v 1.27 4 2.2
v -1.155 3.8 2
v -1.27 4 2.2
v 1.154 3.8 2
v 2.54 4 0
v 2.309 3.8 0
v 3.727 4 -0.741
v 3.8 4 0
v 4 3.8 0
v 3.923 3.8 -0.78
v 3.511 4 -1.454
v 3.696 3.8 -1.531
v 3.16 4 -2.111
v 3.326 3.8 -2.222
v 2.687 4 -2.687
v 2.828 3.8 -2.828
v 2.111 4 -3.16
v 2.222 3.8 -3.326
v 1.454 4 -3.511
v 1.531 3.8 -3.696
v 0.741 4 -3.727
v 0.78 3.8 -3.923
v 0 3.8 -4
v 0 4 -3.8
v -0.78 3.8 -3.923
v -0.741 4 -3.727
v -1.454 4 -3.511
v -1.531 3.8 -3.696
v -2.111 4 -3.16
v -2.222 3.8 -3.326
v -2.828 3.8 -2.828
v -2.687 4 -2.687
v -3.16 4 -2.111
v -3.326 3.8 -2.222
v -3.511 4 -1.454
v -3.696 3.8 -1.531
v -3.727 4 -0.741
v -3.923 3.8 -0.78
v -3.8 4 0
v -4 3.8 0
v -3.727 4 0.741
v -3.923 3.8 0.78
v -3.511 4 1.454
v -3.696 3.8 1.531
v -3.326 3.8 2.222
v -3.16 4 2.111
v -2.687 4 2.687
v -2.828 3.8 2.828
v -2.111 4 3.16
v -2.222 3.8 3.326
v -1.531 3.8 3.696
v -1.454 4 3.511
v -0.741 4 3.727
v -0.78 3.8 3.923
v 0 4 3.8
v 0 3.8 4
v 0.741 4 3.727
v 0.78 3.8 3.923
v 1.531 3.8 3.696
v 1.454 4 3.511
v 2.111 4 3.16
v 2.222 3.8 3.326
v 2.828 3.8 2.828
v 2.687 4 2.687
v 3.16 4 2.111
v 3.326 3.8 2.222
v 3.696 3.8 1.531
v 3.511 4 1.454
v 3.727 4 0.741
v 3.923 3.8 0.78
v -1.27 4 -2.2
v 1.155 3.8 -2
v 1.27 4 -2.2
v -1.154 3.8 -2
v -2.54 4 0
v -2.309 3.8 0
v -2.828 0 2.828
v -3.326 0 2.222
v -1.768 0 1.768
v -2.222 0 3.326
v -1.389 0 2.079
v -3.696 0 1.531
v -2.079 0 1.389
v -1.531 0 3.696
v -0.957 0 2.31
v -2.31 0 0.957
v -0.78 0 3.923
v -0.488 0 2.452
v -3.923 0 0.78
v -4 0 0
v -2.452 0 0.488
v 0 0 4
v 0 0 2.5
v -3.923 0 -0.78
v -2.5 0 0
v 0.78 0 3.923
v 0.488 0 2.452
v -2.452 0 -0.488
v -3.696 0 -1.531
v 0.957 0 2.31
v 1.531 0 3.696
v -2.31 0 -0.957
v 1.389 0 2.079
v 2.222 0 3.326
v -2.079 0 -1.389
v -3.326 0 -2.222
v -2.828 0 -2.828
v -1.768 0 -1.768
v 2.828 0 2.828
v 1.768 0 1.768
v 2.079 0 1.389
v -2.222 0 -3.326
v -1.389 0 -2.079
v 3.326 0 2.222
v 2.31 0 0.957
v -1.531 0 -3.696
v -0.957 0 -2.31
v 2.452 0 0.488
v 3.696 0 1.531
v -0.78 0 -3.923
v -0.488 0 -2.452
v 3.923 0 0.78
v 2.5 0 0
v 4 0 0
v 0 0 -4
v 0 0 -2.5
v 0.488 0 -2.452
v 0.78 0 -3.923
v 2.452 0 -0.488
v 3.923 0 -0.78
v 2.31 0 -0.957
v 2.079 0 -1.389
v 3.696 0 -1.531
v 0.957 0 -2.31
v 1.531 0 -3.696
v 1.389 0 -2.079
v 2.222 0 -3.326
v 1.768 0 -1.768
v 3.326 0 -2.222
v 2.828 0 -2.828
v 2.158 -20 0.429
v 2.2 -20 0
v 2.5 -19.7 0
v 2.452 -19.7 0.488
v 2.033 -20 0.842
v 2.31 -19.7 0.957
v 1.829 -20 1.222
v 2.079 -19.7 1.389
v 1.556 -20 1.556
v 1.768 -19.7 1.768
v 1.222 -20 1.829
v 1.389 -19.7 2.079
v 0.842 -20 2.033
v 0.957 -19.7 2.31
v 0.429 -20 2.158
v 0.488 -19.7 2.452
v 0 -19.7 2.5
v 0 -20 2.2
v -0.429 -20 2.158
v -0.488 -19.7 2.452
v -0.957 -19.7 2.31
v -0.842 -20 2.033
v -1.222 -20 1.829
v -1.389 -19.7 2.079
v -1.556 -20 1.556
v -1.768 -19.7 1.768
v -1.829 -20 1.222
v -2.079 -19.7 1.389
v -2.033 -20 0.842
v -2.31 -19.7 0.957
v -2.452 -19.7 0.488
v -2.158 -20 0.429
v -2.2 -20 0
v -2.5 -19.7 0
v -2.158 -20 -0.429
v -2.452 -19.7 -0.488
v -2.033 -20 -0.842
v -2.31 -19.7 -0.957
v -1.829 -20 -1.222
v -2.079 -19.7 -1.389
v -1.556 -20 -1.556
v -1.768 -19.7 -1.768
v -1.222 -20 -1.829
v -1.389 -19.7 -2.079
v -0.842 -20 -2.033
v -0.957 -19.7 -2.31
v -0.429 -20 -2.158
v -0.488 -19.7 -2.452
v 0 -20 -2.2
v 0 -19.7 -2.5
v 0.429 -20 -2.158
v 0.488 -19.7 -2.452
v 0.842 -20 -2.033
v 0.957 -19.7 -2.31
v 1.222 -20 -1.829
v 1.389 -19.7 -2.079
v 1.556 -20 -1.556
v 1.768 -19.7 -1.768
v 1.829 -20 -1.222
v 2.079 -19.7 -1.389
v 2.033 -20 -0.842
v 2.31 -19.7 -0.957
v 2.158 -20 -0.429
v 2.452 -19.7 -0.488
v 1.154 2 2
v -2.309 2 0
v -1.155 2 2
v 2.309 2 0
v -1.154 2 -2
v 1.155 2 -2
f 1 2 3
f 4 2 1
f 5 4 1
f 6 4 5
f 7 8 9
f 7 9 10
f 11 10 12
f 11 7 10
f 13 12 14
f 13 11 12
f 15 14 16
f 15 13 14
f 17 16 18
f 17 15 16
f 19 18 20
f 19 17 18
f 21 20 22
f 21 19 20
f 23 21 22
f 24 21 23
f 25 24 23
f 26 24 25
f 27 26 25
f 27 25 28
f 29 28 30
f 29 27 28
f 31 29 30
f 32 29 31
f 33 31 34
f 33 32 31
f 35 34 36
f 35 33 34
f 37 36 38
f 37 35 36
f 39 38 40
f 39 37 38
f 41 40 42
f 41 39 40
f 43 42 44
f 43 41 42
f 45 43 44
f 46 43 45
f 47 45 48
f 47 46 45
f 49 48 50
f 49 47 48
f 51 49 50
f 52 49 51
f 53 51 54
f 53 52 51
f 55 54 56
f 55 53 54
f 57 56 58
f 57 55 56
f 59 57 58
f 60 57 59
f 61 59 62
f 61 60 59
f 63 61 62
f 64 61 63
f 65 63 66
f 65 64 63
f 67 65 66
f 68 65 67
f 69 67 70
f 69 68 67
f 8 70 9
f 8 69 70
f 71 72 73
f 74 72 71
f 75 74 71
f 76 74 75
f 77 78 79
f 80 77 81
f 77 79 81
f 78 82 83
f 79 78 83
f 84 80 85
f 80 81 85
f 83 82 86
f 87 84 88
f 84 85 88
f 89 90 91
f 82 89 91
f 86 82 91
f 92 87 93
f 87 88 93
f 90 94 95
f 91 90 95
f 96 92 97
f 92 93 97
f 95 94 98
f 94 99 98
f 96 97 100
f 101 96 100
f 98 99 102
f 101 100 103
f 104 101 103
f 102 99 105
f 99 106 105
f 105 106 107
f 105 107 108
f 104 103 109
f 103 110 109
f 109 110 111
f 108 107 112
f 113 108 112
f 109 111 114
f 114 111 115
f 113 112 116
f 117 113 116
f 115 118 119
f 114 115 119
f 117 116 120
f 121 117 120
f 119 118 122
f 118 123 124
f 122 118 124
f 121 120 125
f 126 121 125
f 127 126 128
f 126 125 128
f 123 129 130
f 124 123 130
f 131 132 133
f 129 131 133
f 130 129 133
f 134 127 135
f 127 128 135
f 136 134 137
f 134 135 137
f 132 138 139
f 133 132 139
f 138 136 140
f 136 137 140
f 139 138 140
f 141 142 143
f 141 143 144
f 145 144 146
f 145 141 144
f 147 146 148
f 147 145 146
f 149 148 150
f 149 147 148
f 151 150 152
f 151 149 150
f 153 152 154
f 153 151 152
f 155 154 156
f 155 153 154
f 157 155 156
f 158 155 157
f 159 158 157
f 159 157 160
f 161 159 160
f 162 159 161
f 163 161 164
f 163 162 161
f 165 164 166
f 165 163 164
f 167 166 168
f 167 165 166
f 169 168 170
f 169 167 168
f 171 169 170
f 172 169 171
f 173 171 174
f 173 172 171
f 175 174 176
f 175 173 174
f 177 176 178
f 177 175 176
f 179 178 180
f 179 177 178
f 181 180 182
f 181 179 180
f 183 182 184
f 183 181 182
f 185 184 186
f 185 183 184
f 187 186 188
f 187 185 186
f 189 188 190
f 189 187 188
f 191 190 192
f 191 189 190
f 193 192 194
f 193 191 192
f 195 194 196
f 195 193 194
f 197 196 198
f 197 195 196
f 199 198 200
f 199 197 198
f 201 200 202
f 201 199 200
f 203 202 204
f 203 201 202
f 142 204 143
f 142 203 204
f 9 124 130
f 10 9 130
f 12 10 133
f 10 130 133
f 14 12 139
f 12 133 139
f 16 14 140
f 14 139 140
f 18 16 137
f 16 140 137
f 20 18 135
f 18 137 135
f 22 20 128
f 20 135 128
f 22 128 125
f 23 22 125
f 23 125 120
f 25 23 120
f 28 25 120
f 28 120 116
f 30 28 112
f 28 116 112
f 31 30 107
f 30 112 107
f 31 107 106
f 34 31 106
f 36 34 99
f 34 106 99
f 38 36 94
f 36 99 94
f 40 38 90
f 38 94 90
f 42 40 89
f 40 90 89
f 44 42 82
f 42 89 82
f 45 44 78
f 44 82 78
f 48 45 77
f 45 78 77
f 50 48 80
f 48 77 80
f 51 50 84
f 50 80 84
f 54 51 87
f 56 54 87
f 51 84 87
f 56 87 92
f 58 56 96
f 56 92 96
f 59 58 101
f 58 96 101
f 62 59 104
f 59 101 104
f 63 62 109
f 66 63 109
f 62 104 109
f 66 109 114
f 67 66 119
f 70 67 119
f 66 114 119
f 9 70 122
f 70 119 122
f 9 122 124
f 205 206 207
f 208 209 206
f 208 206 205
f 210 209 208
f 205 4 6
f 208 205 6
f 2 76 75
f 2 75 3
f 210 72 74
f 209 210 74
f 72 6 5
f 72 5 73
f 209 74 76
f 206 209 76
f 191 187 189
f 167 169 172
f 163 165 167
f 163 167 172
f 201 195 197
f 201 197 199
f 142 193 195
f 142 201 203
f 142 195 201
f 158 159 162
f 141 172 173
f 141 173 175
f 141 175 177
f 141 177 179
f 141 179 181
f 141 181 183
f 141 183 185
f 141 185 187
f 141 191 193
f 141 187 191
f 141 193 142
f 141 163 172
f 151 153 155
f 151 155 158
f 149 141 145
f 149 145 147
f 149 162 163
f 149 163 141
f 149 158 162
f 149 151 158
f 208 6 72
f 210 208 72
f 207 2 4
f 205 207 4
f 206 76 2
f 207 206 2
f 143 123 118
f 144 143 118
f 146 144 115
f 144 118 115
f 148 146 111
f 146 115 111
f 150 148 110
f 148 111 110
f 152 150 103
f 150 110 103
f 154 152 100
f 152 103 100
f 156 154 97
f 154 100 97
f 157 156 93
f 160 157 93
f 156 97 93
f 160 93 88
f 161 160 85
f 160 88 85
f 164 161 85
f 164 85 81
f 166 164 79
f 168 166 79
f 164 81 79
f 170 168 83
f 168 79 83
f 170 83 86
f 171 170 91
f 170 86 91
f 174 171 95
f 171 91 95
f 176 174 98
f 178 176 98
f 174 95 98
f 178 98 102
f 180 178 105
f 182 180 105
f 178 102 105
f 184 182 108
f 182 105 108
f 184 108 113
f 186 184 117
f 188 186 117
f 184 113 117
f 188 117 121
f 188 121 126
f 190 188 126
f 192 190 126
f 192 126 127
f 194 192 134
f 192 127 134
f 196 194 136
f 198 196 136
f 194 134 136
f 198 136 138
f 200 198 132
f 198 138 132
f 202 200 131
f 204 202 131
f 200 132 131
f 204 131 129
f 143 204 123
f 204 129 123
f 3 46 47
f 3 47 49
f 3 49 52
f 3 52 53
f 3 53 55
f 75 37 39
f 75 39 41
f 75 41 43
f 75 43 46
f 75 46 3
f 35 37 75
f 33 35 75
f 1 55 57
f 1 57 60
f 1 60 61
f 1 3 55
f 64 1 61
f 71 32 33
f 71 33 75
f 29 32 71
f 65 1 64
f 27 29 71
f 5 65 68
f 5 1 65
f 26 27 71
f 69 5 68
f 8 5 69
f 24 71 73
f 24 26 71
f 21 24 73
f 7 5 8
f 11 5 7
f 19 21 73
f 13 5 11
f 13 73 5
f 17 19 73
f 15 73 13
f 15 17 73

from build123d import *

# Parameters (mm, degrees)
SKETCH_1_R          = 4
EXTRUDE_1_DEPTH     = 4
SKETCH_2_R          = 2.5
EXTRUDE_2_DEPTH     = 20
CUT_EXTRUDE_1_DEPTH = 2
CHAMFER_1_SIZE      = 0.2
CHAMFER_2_SIZE      = 0.3


with BuildPart() as part:
    # 草图1 → 凸台-拉伸1 (new body)
    with BuildSketch(Plane(origin=(0, 0, 0), x_dir=(1, 0, 0), z_dir=(0, 1, 0))):
        Circle(SKETCH_1_R)
    extrude(amount=EXTRUDE_1_DEPTH)

    # 草图2 → 凸台-拉伸2 (add)
    with BuildSketch(Plane.XZ):
        Circle(SKETCH_2_R)
    extrude(amount=EXTRUDE_2_DEPTH)

    # 草图11 → 切除-拉伸1 (cut)
    with BuildSketch(Plane(origin=(0, 4, 0), x_dir=(1, 0, 0), z_dir=(0, 1, 0))):
        Polygon((1.154954177, 1.999853541), (-1.154446882, 2.000146427), (-2.309401058, 0.000292887), (-1.154954177, -1.999853541), (1.154446882, -2.000146427), (2.309401058, -0.000292887), align=None)
    extrude(amount=-CUT_EXTRUDE_1_DEPTH, mode=Mode.SUBTRACT)

    # 倒角1
    chamfer_1_edges = [part.edges().sort_by_distance(p)[0] for p in [
        (1.732177617, 4, -0.999780327),
        (0.000253647, 4, -1.999999984),
        (-1.73192397, 4, -1.000219657),
        (-1.732177617, 4, 0.999780327),
        (-0.000253647, 4, 1.999999984),
        (1.73192397, 4, 1.000219657),
        (-4, 4, 0),
    ]]
    chamfer(chamfer_1_edges, length=CHAMFER_1_SIZE)

    # 倒角2
    chamfer_2_edges = [part.edges().sort_by_distance(p)[0] for p in [
        (-2.5, -20, 0),
    ]]
    chamfer(chamfer_2_edges, length=CHAMFER_2_SIZE)


solid = part.part
